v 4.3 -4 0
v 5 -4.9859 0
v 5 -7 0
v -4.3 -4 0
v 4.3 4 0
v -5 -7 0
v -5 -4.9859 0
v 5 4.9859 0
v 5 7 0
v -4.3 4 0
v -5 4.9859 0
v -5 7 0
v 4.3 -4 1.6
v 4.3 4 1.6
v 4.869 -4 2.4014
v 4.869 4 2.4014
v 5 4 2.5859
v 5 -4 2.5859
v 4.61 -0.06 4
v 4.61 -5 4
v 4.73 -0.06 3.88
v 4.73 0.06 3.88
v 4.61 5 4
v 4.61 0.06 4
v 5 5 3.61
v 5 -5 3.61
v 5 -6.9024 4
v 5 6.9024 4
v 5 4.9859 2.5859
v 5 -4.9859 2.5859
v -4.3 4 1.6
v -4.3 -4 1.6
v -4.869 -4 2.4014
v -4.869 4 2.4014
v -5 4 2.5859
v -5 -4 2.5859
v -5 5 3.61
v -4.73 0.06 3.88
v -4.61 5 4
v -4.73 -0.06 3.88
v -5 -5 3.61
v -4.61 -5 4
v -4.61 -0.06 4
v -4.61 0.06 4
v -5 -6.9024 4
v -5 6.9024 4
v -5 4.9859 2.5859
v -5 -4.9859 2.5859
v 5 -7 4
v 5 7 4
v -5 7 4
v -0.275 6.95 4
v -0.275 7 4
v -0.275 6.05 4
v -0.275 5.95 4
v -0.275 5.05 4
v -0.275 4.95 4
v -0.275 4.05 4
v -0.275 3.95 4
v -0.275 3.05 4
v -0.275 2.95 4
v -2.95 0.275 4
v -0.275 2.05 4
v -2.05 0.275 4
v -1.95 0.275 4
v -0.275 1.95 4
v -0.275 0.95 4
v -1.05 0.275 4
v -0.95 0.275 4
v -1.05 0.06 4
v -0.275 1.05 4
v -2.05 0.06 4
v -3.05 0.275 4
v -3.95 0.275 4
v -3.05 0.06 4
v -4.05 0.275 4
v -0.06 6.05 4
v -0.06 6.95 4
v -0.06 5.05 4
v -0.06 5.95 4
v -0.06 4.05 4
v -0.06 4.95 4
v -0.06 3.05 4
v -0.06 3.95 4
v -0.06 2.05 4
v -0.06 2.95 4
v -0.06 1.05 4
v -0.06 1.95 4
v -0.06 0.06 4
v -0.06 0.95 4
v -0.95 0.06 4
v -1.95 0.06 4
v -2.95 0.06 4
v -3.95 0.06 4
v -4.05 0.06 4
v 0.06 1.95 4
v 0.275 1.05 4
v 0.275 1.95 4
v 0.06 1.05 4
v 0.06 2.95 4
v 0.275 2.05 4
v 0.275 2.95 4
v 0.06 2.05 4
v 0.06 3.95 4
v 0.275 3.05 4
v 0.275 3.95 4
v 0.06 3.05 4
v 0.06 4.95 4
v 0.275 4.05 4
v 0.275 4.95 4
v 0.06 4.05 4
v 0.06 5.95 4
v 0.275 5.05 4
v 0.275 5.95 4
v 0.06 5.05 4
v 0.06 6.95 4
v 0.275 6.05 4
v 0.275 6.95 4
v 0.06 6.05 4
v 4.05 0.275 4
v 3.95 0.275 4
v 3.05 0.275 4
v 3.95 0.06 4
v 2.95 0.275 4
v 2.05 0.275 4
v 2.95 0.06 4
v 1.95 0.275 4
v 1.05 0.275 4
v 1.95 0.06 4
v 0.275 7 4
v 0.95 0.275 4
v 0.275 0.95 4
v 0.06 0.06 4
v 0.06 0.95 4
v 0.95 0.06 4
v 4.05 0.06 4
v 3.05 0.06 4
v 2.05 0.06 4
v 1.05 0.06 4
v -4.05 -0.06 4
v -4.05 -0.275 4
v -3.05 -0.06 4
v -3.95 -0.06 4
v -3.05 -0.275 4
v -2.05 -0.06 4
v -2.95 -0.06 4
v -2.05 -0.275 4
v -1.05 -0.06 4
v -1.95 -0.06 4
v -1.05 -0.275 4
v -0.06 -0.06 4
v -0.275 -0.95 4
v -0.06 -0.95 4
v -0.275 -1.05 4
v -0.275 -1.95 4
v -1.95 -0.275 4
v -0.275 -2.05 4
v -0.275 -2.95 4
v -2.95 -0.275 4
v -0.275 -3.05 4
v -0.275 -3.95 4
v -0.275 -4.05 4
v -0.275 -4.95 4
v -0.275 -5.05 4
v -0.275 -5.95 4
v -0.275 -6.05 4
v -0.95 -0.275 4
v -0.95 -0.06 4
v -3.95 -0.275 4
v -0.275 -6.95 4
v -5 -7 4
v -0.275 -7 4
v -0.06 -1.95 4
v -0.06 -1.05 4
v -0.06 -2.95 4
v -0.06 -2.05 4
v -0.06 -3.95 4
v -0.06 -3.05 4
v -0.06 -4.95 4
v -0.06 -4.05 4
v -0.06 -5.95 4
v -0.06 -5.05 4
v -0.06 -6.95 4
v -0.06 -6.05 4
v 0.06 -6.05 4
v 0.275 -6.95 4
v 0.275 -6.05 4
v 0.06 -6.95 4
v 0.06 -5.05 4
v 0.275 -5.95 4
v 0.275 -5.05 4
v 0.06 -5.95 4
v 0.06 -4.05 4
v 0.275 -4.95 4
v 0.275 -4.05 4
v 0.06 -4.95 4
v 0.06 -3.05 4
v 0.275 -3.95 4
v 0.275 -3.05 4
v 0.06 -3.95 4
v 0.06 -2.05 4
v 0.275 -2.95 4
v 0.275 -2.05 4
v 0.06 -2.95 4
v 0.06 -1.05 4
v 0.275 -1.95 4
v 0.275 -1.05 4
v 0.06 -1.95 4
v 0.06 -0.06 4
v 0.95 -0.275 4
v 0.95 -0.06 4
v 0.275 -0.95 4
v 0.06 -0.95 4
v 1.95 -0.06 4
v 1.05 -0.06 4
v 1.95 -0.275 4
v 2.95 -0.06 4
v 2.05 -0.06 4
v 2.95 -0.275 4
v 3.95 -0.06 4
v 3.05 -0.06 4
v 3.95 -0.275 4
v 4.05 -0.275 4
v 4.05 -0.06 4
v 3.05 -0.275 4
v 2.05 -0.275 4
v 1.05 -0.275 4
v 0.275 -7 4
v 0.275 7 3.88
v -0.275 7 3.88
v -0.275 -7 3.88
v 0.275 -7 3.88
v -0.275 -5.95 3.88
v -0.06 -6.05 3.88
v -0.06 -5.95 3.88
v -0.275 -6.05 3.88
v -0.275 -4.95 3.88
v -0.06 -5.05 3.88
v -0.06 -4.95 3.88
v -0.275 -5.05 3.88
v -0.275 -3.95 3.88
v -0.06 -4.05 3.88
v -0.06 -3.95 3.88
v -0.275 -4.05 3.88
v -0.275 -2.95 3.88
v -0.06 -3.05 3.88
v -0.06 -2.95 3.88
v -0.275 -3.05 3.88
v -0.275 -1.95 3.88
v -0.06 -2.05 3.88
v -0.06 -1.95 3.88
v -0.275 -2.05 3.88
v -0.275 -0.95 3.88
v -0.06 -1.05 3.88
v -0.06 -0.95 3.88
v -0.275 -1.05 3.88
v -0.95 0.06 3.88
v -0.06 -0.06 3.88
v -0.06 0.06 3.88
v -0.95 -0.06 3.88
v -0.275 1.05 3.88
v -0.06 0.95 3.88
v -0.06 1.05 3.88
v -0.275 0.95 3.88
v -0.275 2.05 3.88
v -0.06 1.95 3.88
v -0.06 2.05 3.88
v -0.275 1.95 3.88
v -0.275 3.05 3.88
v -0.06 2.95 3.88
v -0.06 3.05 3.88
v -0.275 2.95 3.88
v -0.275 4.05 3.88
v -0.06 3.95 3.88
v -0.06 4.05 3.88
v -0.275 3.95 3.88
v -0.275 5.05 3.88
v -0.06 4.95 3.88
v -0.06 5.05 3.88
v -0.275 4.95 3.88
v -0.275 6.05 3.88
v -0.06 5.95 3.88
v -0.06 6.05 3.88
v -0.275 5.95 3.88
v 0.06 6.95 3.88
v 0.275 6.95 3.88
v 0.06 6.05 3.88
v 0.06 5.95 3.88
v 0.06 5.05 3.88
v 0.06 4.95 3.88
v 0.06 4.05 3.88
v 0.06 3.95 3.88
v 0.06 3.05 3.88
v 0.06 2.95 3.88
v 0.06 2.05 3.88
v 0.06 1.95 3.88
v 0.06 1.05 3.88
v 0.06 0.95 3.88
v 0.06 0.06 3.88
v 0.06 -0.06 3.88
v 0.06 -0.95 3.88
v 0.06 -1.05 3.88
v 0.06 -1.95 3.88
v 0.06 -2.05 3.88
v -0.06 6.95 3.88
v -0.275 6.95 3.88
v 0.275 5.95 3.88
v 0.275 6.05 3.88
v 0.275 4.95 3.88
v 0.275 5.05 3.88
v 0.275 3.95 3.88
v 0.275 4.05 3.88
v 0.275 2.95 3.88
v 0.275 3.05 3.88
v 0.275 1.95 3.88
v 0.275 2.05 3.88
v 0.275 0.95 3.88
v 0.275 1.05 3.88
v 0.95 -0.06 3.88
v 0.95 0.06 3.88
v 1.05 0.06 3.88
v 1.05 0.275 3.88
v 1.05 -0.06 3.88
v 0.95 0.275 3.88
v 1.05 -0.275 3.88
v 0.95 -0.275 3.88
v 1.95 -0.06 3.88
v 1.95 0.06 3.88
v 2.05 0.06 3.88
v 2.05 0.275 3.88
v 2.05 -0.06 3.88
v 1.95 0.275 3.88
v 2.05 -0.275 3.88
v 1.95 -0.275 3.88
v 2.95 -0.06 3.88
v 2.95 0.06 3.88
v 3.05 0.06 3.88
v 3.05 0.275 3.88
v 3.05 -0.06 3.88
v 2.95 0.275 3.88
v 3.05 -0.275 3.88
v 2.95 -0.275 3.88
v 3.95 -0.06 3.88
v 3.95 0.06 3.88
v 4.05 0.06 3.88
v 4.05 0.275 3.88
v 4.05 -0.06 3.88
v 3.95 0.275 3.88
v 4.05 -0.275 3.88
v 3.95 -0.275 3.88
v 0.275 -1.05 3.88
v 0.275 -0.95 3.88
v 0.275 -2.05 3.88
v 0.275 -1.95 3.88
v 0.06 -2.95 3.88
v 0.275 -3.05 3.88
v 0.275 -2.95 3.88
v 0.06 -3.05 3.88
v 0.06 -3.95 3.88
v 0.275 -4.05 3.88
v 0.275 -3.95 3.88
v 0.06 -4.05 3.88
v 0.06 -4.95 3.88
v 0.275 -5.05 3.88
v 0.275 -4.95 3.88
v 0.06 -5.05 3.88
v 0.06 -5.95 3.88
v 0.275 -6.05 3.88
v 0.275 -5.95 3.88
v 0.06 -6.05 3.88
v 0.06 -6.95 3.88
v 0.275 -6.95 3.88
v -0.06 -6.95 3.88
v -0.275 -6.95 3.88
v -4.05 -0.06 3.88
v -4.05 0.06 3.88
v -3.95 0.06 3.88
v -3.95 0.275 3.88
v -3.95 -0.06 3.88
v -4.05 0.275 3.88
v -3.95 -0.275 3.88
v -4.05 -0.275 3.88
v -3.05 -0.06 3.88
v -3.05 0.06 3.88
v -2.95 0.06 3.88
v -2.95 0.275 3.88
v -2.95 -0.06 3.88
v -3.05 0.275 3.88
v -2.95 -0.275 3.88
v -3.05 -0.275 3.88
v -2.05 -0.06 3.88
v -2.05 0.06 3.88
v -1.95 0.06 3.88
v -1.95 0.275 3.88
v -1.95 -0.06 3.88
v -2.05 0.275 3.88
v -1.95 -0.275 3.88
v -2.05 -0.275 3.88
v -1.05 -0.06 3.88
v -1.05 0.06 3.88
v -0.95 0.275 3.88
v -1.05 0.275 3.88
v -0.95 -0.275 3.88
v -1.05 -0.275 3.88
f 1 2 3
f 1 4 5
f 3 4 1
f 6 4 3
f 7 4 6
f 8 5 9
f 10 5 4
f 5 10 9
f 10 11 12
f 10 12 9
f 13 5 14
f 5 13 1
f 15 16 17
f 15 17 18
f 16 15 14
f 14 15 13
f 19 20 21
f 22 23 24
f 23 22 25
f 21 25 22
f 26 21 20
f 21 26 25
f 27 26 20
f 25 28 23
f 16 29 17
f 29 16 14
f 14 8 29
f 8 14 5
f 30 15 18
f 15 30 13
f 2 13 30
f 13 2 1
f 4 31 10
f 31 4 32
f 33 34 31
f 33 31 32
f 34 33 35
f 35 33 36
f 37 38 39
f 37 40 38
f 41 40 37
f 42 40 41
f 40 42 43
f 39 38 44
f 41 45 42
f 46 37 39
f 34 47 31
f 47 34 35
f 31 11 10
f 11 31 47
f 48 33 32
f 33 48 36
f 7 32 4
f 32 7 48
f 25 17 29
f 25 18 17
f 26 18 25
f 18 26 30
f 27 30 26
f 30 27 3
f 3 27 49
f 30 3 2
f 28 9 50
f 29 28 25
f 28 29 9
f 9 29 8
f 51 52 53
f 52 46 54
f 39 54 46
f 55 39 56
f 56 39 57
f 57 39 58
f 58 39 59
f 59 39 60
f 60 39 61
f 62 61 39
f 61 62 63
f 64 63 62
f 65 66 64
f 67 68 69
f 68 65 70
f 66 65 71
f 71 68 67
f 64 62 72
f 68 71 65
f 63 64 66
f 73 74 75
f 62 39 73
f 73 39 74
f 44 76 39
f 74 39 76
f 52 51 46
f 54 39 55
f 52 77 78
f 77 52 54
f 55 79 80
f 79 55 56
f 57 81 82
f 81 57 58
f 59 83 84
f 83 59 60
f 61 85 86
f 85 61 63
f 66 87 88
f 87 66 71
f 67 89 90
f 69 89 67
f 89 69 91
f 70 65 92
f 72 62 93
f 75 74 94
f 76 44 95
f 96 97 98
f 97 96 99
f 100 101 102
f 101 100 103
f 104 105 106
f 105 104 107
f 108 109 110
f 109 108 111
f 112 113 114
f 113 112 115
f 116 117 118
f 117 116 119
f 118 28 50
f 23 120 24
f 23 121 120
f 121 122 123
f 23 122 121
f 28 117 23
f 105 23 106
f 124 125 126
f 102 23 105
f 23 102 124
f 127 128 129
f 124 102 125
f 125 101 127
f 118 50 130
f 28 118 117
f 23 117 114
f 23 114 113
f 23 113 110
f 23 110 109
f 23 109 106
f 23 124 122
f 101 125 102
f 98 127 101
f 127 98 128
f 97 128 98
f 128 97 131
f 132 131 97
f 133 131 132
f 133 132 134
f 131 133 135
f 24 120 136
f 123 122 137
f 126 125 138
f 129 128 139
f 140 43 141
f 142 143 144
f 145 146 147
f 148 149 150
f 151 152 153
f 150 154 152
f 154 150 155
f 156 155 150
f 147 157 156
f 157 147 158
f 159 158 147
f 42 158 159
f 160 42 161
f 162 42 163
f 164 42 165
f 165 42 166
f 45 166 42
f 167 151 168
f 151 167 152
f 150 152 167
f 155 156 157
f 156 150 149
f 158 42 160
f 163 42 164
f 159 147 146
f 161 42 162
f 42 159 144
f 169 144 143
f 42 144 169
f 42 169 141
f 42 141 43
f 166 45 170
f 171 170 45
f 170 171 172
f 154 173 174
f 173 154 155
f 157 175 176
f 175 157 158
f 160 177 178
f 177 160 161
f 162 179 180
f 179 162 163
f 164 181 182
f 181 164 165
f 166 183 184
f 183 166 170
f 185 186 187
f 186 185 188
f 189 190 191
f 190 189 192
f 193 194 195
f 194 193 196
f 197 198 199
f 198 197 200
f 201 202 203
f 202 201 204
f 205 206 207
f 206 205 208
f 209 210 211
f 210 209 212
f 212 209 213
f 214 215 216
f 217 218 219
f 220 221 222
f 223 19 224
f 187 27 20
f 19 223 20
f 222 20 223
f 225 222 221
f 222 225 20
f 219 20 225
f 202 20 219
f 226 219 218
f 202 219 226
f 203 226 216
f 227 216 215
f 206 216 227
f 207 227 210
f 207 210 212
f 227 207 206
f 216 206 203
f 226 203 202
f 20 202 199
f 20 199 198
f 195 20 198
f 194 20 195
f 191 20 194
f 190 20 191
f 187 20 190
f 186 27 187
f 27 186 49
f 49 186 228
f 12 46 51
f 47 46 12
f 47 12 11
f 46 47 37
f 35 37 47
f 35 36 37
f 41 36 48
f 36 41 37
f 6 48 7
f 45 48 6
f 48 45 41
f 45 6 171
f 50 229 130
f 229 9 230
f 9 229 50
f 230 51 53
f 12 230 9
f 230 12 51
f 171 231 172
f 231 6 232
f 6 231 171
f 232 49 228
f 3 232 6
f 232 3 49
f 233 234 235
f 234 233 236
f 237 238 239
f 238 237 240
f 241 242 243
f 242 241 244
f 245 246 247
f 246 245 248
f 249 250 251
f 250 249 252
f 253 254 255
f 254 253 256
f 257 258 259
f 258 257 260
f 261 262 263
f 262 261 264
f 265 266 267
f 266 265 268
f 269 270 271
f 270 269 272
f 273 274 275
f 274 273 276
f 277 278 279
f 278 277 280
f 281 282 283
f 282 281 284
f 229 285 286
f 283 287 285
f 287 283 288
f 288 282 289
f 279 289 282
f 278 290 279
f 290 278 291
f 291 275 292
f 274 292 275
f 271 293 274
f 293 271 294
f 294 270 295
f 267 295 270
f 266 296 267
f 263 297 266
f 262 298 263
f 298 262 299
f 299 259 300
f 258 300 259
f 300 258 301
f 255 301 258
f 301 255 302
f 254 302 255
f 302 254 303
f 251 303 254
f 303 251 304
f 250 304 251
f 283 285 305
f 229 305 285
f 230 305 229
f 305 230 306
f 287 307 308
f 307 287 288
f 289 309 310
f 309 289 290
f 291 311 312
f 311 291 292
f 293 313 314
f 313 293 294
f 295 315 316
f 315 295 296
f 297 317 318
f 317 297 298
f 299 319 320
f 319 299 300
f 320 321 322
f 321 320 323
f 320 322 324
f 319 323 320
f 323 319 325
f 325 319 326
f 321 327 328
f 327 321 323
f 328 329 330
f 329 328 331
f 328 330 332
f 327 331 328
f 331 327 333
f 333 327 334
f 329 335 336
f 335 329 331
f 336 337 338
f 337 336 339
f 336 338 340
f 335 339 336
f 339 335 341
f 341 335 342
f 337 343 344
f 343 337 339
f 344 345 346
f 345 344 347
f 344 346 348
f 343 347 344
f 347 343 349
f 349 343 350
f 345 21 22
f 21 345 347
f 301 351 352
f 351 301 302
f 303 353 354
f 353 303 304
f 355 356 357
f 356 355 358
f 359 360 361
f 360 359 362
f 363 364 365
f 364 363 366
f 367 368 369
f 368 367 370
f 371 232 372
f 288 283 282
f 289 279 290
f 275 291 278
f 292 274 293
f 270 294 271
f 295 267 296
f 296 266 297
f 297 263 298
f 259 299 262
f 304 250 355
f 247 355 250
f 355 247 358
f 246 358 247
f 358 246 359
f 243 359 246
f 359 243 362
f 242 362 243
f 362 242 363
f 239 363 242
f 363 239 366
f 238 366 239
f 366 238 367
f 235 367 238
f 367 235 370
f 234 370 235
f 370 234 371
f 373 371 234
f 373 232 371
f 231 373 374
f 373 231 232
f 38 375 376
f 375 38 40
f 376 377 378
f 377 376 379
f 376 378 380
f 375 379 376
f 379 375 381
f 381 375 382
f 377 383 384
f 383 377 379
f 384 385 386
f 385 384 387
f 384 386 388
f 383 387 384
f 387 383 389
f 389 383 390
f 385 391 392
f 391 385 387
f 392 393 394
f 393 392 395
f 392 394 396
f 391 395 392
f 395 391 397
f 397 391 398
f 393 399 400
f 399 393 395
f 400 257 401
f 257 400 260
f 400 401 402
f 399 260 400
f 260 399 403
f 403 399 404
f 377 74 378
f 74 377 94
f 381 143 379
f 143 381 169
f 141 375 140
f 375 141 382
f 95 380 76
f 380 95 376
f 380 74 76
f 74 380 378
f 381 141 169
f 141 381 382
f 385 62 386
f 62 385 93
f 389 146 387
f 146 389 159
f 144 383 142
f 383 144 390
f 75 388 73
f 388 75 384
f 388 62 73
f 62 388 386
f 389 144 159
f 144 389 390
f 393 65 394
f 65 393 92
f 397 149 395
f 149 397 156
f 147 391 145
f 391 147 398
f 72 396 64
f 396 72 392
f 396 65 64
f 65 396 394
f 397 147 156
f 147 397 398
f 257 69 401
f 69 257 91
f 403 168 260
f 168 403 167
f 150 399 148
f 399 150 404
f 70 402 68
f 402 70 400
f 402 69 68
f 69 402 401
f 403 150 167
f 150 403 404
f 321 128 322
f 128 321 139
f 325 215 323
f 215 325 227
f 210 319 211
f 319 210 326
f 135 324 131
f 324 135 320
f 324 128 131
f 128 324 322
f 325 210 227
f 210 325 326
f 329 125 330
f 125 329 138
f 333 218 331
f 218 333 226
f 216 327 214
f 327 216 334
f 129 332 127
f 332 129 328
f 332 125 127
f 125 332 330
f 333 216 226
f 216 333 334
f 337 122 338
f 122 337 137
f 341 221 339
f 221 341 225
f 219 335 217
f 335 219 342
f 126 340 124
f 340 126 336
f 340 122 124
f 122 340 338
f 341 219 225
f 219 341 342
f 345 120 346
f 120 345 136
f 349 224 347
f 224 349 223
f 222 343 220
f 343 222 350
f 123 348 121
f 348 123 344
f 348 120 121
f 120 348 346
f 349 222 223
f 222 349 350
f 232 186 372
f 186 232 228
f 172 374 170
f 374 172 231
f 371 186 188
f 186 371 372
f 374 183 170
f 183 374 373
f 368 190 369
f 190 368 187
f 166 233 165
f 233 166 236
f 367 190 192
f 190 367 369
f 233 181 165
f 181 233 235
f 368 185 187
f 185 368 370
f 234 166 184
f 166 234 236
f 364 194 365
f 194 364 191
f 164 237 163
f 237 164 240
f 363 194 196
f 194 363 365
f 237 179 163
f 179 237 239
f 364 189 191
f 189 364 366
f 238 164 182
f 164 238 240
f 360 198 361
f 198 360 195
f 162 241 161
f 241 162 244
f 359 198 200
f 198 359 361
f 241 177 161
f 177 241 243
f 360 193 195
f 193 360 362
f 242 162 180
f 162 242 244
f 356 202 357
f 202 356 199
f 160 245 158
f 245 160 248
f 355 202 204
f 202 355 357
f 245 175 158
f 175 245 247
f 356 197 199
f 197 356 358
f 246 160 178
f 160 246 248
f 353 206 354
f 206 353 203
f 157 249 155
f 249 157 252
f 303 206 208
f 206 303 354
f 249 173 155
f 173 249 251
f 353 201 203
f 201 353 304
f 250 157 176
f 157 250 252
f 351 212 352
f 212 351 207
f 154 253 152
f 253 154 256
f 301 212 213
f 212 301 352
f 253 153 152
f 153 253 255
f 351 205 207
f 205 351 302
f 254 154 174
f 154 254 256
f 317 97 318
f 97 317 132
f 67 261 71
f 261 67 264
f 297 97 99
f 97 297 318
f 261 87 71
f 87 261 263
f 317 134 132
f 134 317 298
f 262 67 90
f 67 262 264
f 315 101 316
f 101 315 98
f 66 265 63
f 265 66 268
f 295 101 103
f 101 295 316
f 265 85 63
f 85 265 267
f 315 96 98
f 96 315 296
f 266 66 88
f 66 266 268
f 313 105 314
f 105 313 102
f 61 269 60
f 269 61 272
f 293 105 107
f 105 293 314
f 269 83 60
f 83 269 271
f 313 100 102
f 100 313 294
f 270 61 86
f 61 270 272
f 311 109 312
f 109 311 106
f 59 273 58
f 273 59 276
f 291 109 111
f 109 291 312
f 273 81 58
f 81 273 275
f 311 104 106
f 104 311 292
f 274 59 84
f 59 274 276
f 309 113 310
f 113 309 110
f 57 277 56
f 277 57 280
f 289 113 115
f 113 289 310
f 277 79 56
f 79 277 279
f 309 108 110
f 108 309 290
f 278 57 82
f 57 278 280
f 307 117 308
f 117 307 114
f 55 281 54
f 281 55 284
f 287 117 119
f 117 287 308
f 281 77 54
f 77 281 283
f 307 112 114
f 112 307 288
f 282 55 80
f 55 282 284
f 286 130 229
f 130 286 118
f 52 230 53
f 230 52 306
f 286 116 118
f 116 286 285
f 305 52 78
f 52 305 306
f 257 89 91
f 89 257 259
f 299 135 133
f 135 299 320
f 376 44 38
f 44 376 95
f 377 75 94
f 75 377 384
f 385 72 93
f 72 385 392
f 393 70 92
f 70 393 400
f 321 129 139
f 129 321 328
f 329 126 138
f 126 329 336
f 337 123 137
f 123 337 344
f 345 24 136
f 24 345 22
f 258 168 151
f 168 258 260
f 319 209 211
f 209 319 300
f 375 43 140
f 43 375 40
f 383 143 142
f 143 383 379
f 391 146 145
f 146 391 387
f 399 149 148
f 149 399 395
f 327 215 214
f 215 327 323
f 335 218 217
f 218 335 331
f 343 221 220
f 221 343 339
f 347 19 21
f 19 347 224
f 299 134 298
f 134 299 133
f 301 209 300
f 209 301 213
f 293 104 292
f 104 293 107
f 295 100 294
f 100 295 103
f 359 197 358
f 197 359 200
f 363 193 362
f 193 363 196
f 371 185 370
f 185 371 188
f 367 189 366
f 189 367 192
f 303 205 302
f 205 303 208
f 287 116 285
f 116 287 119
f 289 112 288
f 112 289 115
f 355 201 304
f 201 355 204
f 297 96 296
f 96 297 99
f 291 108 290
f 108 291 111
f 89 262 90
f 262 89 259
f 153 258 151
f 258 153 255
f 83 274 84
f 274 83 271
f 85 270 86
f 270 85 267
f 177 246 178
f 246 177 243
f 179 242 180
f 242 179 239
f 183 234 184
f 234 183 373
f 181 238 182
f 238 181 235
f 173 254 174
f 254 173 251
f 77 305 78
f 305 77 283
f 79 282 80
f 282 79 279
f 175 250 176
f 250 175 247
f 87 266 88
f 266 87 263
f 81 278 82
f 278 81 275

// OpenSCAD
// file: ../lib/BOSL2/std.scad
// Minimal BOSL2 compatibility shim for bundled gallery models.
// It implements only the helpers used by the imported OpenSCAD projects.

CENTER = [0, 0, 0];
BOTTOM = [0, 0, -1];
TOP = [0, 0, 1];
LEFT = [-1, 0, 0];
RIGHT = [1, 0, 0];
FRONT = [0, -1, 0];
BACK = [0, 1, 0];

module up(z=0) {
    translate([0, 0, z]) children();
}

module down(z=0) {
    translate([0, 0, -z]) children();
}

module attach(anchor=CENTER) {
    children();
}

module cuboid(size=[1, 1, 1], anchor=CENTER) {
    center = anchor == CENTER;
    translate(center ? [0, 0, 0] : [0, 0, size[2] / 2])
        cube(size, center=true);
    children();
}

module xcyl(h=1, r=1, anchor=CENTER) {
    center = anchor == CENTER;
    translate(center ? [0, 0, 0] : [h / 2, 0, 0])
        rotate([0, 90, 0])
            cylinder(h=h, r=r, center=true);
}
// file: ../components/node-receiver/BOSL2/std.scad
// Minimal BOSL2 compatibility shim for bundled gallery models.
// It implements only the helpers used by the imported OpenSCAD projects.

CENTER = [0, 0, 0];
BOTTOM = [0, 0, -1];
TOP = [0, 0, 1];
LEFT = [-1, 0, 0];
RIGHT = [1, 0, 0];
FRONT = [0, -1, 0];
BACK = [0, 1, 0];

module up(z=0) {
    translate([0, 0, z]) children();
}

module down(z=0) {
    translate([0, 0, -z]) children();
}

module attach(anchor=CENTER) {
    children();
}

module cuboid(size=[1, 1, 1], anchor=CENTER) {
    center = anchor == CENTER;
    translate(center ? [0, 0, 0] : [0, 0, size[2] / 2])
        cube(size, center=true);
    children();
}

module xcyl(h=1, r=1, anchor=CENTER) {
    center = anchor == CENTER;
    translate(center ? [0, 0, 0] : [h / 2, 0, 0])
        rotate([0, 90, 0])
            cylinder(h=h, r=r, center=true);
}
// file: ../components/node-receiver/node_receiver.scad
// SPDX-License-Identifier: CC-BY-NC-SA-4.0
//
// Primary experiment-owned fixed-side design object.

include <BOSL2/std.scad>

$fn = 120;

use <../../lib/node_interface.scad>

module node_receiver_build(mm_pattern = true) {
    node_receiver(mm_pattern);
}



// -----------------------------------------------------------------------------
// Design-documentation construction states
// -----------------------------------------------------------------------------
// These modules deliberately expose the construction sequence used by
// design/design.md. They do not introduce a second production geometry path;
// every cutter is the same cutter used by node_receiver().

module node_receiver_design_base_block() {
    translate([
        -node_receiver_width() / 2,
        -node_receiver_length() / 2,
        0
    ])
        cube([
            node_receiver_width(),
            node_receiver_length(),
            node_receiver_height()
        ]);
}

module node_receiver_design_lower_cutters() {
    union() {
        _node_positive_x_lower_cut_active();
        _node_positive_y_lower_cut_transition();
        mirror([0, 1, 0])
            _node_positive_y_lower_cut_transition();

        mirror([1, 0, 0]) {
            _node_positive_x_lower_cut_active();
            _node_positive_y_lower_cut_transition();
            mirror([0, 1, 0])
                _node_positive_y_lower_cut_transition();
        }
    }
}

module node_receiver_design_top_guide_cutters() {
    union() {
        _node_positive_x_top_guide_cut();
        mirror([1, 0, 0])
            _node_positive_x_top_guide_cut();
    }
}

module node_receiver_design_top_main_cutters() {
    // Analysis-only view of the central 10 mm portion of the REAL production
    // cutter. This explains the intended constant X/Z lead-in without creating
    // a second geometry implementation.
    intersection() {
        node_receiver_design_top_guide_cutters();

        translate([
            -node_receiver_width(),
            -node_receiver_functional_length() / 2,
            -1
        ])
            cube([
                2 * node_receiver_width(),
                node_receiver_functional_length(),
                node_receiver_height() + 2
            ]);
    }
}

module node_receiver_design_after_lower() {
    difference() {
        node_receiver_design_base_block();
        node_receiver_design_lower_cutters();
    }
}

module node_receiver_design_top_removed_material() {
    // Only show the part of the single production cutter that intersects the
    // current receiver. Every red fragment in the design render must therefore
    // disappear in the next state.
    intersection() {
        node_receiver_design_after_lower();
        node_receiver_design_top_guide_cutters();
    }
}

module node_receiver_design_after_top_guide() {
    difference() {
        node_receiver_design_after_lower();
        node_receiver_design_top_guide_cutters();
    }
}

module node_receiver_design_plain() {
    node_receiver_design_after_top_guide();
}

module node_receiver_design_pattern_cutters() {
    _node_mm_reference_cuts_at_top(
        node_receiver_height(),
        node_receiver_width(),
        node_receiver_length()
    );
}

// Standalone opening shows the primary receiver object.
node_receiver_build();
// file: BOSL2/std.scad
// Minimal BOSL2 compatibility shim for bundled gallery models.
// It implements only the helpers used by the imported OpenSCAD projects.

CENTER = [0, 0, 0];
BOTTOM = [0, 0, -1];
TOP = [0, 0, 1];
LEFT = [-1, 0, 0];
RIGHT = [1, 0, 0];
FRONT = [0, -1, 0];
BACK = [0, 1, 0];

module up(z=0) {
    translate([0, 0, z]) children();
}

module down(z=0) {
    translate([0, 0, -z]) children();
}

module attach(anchor=CENTER) {
    children();
}

module cuboid(size=[1, 1, 1], anchor=CENTER) {
    center = anchor == CENTER;
    translate(center ? [0, 0, 0] : [0, 0, size[2] / 2])
        cube(size, center=true);
    children();
}

module xcyl(h=1, r=1, anchor=CENTER) {
    center = anchor == CENTER;
    translate(center ? [0, 0, 0] : [h / 2, 0, 0])
        rotate([0, 90, 0])
            cylinder(h=h, r=r, center=true);
}
// main file
include <BOSL2/std.scad>

$fn = 120;
use <../components/node-receiver/node_receiver.scad>

$vpt=[0,0,2];
$vpr=[68,0,28];
// Small 10 x 14 mm object: frame it tightly enough to read the top guide.
$vpd=40;

color([0.68,0.70,0.74])
    node_receiver_build(true);
